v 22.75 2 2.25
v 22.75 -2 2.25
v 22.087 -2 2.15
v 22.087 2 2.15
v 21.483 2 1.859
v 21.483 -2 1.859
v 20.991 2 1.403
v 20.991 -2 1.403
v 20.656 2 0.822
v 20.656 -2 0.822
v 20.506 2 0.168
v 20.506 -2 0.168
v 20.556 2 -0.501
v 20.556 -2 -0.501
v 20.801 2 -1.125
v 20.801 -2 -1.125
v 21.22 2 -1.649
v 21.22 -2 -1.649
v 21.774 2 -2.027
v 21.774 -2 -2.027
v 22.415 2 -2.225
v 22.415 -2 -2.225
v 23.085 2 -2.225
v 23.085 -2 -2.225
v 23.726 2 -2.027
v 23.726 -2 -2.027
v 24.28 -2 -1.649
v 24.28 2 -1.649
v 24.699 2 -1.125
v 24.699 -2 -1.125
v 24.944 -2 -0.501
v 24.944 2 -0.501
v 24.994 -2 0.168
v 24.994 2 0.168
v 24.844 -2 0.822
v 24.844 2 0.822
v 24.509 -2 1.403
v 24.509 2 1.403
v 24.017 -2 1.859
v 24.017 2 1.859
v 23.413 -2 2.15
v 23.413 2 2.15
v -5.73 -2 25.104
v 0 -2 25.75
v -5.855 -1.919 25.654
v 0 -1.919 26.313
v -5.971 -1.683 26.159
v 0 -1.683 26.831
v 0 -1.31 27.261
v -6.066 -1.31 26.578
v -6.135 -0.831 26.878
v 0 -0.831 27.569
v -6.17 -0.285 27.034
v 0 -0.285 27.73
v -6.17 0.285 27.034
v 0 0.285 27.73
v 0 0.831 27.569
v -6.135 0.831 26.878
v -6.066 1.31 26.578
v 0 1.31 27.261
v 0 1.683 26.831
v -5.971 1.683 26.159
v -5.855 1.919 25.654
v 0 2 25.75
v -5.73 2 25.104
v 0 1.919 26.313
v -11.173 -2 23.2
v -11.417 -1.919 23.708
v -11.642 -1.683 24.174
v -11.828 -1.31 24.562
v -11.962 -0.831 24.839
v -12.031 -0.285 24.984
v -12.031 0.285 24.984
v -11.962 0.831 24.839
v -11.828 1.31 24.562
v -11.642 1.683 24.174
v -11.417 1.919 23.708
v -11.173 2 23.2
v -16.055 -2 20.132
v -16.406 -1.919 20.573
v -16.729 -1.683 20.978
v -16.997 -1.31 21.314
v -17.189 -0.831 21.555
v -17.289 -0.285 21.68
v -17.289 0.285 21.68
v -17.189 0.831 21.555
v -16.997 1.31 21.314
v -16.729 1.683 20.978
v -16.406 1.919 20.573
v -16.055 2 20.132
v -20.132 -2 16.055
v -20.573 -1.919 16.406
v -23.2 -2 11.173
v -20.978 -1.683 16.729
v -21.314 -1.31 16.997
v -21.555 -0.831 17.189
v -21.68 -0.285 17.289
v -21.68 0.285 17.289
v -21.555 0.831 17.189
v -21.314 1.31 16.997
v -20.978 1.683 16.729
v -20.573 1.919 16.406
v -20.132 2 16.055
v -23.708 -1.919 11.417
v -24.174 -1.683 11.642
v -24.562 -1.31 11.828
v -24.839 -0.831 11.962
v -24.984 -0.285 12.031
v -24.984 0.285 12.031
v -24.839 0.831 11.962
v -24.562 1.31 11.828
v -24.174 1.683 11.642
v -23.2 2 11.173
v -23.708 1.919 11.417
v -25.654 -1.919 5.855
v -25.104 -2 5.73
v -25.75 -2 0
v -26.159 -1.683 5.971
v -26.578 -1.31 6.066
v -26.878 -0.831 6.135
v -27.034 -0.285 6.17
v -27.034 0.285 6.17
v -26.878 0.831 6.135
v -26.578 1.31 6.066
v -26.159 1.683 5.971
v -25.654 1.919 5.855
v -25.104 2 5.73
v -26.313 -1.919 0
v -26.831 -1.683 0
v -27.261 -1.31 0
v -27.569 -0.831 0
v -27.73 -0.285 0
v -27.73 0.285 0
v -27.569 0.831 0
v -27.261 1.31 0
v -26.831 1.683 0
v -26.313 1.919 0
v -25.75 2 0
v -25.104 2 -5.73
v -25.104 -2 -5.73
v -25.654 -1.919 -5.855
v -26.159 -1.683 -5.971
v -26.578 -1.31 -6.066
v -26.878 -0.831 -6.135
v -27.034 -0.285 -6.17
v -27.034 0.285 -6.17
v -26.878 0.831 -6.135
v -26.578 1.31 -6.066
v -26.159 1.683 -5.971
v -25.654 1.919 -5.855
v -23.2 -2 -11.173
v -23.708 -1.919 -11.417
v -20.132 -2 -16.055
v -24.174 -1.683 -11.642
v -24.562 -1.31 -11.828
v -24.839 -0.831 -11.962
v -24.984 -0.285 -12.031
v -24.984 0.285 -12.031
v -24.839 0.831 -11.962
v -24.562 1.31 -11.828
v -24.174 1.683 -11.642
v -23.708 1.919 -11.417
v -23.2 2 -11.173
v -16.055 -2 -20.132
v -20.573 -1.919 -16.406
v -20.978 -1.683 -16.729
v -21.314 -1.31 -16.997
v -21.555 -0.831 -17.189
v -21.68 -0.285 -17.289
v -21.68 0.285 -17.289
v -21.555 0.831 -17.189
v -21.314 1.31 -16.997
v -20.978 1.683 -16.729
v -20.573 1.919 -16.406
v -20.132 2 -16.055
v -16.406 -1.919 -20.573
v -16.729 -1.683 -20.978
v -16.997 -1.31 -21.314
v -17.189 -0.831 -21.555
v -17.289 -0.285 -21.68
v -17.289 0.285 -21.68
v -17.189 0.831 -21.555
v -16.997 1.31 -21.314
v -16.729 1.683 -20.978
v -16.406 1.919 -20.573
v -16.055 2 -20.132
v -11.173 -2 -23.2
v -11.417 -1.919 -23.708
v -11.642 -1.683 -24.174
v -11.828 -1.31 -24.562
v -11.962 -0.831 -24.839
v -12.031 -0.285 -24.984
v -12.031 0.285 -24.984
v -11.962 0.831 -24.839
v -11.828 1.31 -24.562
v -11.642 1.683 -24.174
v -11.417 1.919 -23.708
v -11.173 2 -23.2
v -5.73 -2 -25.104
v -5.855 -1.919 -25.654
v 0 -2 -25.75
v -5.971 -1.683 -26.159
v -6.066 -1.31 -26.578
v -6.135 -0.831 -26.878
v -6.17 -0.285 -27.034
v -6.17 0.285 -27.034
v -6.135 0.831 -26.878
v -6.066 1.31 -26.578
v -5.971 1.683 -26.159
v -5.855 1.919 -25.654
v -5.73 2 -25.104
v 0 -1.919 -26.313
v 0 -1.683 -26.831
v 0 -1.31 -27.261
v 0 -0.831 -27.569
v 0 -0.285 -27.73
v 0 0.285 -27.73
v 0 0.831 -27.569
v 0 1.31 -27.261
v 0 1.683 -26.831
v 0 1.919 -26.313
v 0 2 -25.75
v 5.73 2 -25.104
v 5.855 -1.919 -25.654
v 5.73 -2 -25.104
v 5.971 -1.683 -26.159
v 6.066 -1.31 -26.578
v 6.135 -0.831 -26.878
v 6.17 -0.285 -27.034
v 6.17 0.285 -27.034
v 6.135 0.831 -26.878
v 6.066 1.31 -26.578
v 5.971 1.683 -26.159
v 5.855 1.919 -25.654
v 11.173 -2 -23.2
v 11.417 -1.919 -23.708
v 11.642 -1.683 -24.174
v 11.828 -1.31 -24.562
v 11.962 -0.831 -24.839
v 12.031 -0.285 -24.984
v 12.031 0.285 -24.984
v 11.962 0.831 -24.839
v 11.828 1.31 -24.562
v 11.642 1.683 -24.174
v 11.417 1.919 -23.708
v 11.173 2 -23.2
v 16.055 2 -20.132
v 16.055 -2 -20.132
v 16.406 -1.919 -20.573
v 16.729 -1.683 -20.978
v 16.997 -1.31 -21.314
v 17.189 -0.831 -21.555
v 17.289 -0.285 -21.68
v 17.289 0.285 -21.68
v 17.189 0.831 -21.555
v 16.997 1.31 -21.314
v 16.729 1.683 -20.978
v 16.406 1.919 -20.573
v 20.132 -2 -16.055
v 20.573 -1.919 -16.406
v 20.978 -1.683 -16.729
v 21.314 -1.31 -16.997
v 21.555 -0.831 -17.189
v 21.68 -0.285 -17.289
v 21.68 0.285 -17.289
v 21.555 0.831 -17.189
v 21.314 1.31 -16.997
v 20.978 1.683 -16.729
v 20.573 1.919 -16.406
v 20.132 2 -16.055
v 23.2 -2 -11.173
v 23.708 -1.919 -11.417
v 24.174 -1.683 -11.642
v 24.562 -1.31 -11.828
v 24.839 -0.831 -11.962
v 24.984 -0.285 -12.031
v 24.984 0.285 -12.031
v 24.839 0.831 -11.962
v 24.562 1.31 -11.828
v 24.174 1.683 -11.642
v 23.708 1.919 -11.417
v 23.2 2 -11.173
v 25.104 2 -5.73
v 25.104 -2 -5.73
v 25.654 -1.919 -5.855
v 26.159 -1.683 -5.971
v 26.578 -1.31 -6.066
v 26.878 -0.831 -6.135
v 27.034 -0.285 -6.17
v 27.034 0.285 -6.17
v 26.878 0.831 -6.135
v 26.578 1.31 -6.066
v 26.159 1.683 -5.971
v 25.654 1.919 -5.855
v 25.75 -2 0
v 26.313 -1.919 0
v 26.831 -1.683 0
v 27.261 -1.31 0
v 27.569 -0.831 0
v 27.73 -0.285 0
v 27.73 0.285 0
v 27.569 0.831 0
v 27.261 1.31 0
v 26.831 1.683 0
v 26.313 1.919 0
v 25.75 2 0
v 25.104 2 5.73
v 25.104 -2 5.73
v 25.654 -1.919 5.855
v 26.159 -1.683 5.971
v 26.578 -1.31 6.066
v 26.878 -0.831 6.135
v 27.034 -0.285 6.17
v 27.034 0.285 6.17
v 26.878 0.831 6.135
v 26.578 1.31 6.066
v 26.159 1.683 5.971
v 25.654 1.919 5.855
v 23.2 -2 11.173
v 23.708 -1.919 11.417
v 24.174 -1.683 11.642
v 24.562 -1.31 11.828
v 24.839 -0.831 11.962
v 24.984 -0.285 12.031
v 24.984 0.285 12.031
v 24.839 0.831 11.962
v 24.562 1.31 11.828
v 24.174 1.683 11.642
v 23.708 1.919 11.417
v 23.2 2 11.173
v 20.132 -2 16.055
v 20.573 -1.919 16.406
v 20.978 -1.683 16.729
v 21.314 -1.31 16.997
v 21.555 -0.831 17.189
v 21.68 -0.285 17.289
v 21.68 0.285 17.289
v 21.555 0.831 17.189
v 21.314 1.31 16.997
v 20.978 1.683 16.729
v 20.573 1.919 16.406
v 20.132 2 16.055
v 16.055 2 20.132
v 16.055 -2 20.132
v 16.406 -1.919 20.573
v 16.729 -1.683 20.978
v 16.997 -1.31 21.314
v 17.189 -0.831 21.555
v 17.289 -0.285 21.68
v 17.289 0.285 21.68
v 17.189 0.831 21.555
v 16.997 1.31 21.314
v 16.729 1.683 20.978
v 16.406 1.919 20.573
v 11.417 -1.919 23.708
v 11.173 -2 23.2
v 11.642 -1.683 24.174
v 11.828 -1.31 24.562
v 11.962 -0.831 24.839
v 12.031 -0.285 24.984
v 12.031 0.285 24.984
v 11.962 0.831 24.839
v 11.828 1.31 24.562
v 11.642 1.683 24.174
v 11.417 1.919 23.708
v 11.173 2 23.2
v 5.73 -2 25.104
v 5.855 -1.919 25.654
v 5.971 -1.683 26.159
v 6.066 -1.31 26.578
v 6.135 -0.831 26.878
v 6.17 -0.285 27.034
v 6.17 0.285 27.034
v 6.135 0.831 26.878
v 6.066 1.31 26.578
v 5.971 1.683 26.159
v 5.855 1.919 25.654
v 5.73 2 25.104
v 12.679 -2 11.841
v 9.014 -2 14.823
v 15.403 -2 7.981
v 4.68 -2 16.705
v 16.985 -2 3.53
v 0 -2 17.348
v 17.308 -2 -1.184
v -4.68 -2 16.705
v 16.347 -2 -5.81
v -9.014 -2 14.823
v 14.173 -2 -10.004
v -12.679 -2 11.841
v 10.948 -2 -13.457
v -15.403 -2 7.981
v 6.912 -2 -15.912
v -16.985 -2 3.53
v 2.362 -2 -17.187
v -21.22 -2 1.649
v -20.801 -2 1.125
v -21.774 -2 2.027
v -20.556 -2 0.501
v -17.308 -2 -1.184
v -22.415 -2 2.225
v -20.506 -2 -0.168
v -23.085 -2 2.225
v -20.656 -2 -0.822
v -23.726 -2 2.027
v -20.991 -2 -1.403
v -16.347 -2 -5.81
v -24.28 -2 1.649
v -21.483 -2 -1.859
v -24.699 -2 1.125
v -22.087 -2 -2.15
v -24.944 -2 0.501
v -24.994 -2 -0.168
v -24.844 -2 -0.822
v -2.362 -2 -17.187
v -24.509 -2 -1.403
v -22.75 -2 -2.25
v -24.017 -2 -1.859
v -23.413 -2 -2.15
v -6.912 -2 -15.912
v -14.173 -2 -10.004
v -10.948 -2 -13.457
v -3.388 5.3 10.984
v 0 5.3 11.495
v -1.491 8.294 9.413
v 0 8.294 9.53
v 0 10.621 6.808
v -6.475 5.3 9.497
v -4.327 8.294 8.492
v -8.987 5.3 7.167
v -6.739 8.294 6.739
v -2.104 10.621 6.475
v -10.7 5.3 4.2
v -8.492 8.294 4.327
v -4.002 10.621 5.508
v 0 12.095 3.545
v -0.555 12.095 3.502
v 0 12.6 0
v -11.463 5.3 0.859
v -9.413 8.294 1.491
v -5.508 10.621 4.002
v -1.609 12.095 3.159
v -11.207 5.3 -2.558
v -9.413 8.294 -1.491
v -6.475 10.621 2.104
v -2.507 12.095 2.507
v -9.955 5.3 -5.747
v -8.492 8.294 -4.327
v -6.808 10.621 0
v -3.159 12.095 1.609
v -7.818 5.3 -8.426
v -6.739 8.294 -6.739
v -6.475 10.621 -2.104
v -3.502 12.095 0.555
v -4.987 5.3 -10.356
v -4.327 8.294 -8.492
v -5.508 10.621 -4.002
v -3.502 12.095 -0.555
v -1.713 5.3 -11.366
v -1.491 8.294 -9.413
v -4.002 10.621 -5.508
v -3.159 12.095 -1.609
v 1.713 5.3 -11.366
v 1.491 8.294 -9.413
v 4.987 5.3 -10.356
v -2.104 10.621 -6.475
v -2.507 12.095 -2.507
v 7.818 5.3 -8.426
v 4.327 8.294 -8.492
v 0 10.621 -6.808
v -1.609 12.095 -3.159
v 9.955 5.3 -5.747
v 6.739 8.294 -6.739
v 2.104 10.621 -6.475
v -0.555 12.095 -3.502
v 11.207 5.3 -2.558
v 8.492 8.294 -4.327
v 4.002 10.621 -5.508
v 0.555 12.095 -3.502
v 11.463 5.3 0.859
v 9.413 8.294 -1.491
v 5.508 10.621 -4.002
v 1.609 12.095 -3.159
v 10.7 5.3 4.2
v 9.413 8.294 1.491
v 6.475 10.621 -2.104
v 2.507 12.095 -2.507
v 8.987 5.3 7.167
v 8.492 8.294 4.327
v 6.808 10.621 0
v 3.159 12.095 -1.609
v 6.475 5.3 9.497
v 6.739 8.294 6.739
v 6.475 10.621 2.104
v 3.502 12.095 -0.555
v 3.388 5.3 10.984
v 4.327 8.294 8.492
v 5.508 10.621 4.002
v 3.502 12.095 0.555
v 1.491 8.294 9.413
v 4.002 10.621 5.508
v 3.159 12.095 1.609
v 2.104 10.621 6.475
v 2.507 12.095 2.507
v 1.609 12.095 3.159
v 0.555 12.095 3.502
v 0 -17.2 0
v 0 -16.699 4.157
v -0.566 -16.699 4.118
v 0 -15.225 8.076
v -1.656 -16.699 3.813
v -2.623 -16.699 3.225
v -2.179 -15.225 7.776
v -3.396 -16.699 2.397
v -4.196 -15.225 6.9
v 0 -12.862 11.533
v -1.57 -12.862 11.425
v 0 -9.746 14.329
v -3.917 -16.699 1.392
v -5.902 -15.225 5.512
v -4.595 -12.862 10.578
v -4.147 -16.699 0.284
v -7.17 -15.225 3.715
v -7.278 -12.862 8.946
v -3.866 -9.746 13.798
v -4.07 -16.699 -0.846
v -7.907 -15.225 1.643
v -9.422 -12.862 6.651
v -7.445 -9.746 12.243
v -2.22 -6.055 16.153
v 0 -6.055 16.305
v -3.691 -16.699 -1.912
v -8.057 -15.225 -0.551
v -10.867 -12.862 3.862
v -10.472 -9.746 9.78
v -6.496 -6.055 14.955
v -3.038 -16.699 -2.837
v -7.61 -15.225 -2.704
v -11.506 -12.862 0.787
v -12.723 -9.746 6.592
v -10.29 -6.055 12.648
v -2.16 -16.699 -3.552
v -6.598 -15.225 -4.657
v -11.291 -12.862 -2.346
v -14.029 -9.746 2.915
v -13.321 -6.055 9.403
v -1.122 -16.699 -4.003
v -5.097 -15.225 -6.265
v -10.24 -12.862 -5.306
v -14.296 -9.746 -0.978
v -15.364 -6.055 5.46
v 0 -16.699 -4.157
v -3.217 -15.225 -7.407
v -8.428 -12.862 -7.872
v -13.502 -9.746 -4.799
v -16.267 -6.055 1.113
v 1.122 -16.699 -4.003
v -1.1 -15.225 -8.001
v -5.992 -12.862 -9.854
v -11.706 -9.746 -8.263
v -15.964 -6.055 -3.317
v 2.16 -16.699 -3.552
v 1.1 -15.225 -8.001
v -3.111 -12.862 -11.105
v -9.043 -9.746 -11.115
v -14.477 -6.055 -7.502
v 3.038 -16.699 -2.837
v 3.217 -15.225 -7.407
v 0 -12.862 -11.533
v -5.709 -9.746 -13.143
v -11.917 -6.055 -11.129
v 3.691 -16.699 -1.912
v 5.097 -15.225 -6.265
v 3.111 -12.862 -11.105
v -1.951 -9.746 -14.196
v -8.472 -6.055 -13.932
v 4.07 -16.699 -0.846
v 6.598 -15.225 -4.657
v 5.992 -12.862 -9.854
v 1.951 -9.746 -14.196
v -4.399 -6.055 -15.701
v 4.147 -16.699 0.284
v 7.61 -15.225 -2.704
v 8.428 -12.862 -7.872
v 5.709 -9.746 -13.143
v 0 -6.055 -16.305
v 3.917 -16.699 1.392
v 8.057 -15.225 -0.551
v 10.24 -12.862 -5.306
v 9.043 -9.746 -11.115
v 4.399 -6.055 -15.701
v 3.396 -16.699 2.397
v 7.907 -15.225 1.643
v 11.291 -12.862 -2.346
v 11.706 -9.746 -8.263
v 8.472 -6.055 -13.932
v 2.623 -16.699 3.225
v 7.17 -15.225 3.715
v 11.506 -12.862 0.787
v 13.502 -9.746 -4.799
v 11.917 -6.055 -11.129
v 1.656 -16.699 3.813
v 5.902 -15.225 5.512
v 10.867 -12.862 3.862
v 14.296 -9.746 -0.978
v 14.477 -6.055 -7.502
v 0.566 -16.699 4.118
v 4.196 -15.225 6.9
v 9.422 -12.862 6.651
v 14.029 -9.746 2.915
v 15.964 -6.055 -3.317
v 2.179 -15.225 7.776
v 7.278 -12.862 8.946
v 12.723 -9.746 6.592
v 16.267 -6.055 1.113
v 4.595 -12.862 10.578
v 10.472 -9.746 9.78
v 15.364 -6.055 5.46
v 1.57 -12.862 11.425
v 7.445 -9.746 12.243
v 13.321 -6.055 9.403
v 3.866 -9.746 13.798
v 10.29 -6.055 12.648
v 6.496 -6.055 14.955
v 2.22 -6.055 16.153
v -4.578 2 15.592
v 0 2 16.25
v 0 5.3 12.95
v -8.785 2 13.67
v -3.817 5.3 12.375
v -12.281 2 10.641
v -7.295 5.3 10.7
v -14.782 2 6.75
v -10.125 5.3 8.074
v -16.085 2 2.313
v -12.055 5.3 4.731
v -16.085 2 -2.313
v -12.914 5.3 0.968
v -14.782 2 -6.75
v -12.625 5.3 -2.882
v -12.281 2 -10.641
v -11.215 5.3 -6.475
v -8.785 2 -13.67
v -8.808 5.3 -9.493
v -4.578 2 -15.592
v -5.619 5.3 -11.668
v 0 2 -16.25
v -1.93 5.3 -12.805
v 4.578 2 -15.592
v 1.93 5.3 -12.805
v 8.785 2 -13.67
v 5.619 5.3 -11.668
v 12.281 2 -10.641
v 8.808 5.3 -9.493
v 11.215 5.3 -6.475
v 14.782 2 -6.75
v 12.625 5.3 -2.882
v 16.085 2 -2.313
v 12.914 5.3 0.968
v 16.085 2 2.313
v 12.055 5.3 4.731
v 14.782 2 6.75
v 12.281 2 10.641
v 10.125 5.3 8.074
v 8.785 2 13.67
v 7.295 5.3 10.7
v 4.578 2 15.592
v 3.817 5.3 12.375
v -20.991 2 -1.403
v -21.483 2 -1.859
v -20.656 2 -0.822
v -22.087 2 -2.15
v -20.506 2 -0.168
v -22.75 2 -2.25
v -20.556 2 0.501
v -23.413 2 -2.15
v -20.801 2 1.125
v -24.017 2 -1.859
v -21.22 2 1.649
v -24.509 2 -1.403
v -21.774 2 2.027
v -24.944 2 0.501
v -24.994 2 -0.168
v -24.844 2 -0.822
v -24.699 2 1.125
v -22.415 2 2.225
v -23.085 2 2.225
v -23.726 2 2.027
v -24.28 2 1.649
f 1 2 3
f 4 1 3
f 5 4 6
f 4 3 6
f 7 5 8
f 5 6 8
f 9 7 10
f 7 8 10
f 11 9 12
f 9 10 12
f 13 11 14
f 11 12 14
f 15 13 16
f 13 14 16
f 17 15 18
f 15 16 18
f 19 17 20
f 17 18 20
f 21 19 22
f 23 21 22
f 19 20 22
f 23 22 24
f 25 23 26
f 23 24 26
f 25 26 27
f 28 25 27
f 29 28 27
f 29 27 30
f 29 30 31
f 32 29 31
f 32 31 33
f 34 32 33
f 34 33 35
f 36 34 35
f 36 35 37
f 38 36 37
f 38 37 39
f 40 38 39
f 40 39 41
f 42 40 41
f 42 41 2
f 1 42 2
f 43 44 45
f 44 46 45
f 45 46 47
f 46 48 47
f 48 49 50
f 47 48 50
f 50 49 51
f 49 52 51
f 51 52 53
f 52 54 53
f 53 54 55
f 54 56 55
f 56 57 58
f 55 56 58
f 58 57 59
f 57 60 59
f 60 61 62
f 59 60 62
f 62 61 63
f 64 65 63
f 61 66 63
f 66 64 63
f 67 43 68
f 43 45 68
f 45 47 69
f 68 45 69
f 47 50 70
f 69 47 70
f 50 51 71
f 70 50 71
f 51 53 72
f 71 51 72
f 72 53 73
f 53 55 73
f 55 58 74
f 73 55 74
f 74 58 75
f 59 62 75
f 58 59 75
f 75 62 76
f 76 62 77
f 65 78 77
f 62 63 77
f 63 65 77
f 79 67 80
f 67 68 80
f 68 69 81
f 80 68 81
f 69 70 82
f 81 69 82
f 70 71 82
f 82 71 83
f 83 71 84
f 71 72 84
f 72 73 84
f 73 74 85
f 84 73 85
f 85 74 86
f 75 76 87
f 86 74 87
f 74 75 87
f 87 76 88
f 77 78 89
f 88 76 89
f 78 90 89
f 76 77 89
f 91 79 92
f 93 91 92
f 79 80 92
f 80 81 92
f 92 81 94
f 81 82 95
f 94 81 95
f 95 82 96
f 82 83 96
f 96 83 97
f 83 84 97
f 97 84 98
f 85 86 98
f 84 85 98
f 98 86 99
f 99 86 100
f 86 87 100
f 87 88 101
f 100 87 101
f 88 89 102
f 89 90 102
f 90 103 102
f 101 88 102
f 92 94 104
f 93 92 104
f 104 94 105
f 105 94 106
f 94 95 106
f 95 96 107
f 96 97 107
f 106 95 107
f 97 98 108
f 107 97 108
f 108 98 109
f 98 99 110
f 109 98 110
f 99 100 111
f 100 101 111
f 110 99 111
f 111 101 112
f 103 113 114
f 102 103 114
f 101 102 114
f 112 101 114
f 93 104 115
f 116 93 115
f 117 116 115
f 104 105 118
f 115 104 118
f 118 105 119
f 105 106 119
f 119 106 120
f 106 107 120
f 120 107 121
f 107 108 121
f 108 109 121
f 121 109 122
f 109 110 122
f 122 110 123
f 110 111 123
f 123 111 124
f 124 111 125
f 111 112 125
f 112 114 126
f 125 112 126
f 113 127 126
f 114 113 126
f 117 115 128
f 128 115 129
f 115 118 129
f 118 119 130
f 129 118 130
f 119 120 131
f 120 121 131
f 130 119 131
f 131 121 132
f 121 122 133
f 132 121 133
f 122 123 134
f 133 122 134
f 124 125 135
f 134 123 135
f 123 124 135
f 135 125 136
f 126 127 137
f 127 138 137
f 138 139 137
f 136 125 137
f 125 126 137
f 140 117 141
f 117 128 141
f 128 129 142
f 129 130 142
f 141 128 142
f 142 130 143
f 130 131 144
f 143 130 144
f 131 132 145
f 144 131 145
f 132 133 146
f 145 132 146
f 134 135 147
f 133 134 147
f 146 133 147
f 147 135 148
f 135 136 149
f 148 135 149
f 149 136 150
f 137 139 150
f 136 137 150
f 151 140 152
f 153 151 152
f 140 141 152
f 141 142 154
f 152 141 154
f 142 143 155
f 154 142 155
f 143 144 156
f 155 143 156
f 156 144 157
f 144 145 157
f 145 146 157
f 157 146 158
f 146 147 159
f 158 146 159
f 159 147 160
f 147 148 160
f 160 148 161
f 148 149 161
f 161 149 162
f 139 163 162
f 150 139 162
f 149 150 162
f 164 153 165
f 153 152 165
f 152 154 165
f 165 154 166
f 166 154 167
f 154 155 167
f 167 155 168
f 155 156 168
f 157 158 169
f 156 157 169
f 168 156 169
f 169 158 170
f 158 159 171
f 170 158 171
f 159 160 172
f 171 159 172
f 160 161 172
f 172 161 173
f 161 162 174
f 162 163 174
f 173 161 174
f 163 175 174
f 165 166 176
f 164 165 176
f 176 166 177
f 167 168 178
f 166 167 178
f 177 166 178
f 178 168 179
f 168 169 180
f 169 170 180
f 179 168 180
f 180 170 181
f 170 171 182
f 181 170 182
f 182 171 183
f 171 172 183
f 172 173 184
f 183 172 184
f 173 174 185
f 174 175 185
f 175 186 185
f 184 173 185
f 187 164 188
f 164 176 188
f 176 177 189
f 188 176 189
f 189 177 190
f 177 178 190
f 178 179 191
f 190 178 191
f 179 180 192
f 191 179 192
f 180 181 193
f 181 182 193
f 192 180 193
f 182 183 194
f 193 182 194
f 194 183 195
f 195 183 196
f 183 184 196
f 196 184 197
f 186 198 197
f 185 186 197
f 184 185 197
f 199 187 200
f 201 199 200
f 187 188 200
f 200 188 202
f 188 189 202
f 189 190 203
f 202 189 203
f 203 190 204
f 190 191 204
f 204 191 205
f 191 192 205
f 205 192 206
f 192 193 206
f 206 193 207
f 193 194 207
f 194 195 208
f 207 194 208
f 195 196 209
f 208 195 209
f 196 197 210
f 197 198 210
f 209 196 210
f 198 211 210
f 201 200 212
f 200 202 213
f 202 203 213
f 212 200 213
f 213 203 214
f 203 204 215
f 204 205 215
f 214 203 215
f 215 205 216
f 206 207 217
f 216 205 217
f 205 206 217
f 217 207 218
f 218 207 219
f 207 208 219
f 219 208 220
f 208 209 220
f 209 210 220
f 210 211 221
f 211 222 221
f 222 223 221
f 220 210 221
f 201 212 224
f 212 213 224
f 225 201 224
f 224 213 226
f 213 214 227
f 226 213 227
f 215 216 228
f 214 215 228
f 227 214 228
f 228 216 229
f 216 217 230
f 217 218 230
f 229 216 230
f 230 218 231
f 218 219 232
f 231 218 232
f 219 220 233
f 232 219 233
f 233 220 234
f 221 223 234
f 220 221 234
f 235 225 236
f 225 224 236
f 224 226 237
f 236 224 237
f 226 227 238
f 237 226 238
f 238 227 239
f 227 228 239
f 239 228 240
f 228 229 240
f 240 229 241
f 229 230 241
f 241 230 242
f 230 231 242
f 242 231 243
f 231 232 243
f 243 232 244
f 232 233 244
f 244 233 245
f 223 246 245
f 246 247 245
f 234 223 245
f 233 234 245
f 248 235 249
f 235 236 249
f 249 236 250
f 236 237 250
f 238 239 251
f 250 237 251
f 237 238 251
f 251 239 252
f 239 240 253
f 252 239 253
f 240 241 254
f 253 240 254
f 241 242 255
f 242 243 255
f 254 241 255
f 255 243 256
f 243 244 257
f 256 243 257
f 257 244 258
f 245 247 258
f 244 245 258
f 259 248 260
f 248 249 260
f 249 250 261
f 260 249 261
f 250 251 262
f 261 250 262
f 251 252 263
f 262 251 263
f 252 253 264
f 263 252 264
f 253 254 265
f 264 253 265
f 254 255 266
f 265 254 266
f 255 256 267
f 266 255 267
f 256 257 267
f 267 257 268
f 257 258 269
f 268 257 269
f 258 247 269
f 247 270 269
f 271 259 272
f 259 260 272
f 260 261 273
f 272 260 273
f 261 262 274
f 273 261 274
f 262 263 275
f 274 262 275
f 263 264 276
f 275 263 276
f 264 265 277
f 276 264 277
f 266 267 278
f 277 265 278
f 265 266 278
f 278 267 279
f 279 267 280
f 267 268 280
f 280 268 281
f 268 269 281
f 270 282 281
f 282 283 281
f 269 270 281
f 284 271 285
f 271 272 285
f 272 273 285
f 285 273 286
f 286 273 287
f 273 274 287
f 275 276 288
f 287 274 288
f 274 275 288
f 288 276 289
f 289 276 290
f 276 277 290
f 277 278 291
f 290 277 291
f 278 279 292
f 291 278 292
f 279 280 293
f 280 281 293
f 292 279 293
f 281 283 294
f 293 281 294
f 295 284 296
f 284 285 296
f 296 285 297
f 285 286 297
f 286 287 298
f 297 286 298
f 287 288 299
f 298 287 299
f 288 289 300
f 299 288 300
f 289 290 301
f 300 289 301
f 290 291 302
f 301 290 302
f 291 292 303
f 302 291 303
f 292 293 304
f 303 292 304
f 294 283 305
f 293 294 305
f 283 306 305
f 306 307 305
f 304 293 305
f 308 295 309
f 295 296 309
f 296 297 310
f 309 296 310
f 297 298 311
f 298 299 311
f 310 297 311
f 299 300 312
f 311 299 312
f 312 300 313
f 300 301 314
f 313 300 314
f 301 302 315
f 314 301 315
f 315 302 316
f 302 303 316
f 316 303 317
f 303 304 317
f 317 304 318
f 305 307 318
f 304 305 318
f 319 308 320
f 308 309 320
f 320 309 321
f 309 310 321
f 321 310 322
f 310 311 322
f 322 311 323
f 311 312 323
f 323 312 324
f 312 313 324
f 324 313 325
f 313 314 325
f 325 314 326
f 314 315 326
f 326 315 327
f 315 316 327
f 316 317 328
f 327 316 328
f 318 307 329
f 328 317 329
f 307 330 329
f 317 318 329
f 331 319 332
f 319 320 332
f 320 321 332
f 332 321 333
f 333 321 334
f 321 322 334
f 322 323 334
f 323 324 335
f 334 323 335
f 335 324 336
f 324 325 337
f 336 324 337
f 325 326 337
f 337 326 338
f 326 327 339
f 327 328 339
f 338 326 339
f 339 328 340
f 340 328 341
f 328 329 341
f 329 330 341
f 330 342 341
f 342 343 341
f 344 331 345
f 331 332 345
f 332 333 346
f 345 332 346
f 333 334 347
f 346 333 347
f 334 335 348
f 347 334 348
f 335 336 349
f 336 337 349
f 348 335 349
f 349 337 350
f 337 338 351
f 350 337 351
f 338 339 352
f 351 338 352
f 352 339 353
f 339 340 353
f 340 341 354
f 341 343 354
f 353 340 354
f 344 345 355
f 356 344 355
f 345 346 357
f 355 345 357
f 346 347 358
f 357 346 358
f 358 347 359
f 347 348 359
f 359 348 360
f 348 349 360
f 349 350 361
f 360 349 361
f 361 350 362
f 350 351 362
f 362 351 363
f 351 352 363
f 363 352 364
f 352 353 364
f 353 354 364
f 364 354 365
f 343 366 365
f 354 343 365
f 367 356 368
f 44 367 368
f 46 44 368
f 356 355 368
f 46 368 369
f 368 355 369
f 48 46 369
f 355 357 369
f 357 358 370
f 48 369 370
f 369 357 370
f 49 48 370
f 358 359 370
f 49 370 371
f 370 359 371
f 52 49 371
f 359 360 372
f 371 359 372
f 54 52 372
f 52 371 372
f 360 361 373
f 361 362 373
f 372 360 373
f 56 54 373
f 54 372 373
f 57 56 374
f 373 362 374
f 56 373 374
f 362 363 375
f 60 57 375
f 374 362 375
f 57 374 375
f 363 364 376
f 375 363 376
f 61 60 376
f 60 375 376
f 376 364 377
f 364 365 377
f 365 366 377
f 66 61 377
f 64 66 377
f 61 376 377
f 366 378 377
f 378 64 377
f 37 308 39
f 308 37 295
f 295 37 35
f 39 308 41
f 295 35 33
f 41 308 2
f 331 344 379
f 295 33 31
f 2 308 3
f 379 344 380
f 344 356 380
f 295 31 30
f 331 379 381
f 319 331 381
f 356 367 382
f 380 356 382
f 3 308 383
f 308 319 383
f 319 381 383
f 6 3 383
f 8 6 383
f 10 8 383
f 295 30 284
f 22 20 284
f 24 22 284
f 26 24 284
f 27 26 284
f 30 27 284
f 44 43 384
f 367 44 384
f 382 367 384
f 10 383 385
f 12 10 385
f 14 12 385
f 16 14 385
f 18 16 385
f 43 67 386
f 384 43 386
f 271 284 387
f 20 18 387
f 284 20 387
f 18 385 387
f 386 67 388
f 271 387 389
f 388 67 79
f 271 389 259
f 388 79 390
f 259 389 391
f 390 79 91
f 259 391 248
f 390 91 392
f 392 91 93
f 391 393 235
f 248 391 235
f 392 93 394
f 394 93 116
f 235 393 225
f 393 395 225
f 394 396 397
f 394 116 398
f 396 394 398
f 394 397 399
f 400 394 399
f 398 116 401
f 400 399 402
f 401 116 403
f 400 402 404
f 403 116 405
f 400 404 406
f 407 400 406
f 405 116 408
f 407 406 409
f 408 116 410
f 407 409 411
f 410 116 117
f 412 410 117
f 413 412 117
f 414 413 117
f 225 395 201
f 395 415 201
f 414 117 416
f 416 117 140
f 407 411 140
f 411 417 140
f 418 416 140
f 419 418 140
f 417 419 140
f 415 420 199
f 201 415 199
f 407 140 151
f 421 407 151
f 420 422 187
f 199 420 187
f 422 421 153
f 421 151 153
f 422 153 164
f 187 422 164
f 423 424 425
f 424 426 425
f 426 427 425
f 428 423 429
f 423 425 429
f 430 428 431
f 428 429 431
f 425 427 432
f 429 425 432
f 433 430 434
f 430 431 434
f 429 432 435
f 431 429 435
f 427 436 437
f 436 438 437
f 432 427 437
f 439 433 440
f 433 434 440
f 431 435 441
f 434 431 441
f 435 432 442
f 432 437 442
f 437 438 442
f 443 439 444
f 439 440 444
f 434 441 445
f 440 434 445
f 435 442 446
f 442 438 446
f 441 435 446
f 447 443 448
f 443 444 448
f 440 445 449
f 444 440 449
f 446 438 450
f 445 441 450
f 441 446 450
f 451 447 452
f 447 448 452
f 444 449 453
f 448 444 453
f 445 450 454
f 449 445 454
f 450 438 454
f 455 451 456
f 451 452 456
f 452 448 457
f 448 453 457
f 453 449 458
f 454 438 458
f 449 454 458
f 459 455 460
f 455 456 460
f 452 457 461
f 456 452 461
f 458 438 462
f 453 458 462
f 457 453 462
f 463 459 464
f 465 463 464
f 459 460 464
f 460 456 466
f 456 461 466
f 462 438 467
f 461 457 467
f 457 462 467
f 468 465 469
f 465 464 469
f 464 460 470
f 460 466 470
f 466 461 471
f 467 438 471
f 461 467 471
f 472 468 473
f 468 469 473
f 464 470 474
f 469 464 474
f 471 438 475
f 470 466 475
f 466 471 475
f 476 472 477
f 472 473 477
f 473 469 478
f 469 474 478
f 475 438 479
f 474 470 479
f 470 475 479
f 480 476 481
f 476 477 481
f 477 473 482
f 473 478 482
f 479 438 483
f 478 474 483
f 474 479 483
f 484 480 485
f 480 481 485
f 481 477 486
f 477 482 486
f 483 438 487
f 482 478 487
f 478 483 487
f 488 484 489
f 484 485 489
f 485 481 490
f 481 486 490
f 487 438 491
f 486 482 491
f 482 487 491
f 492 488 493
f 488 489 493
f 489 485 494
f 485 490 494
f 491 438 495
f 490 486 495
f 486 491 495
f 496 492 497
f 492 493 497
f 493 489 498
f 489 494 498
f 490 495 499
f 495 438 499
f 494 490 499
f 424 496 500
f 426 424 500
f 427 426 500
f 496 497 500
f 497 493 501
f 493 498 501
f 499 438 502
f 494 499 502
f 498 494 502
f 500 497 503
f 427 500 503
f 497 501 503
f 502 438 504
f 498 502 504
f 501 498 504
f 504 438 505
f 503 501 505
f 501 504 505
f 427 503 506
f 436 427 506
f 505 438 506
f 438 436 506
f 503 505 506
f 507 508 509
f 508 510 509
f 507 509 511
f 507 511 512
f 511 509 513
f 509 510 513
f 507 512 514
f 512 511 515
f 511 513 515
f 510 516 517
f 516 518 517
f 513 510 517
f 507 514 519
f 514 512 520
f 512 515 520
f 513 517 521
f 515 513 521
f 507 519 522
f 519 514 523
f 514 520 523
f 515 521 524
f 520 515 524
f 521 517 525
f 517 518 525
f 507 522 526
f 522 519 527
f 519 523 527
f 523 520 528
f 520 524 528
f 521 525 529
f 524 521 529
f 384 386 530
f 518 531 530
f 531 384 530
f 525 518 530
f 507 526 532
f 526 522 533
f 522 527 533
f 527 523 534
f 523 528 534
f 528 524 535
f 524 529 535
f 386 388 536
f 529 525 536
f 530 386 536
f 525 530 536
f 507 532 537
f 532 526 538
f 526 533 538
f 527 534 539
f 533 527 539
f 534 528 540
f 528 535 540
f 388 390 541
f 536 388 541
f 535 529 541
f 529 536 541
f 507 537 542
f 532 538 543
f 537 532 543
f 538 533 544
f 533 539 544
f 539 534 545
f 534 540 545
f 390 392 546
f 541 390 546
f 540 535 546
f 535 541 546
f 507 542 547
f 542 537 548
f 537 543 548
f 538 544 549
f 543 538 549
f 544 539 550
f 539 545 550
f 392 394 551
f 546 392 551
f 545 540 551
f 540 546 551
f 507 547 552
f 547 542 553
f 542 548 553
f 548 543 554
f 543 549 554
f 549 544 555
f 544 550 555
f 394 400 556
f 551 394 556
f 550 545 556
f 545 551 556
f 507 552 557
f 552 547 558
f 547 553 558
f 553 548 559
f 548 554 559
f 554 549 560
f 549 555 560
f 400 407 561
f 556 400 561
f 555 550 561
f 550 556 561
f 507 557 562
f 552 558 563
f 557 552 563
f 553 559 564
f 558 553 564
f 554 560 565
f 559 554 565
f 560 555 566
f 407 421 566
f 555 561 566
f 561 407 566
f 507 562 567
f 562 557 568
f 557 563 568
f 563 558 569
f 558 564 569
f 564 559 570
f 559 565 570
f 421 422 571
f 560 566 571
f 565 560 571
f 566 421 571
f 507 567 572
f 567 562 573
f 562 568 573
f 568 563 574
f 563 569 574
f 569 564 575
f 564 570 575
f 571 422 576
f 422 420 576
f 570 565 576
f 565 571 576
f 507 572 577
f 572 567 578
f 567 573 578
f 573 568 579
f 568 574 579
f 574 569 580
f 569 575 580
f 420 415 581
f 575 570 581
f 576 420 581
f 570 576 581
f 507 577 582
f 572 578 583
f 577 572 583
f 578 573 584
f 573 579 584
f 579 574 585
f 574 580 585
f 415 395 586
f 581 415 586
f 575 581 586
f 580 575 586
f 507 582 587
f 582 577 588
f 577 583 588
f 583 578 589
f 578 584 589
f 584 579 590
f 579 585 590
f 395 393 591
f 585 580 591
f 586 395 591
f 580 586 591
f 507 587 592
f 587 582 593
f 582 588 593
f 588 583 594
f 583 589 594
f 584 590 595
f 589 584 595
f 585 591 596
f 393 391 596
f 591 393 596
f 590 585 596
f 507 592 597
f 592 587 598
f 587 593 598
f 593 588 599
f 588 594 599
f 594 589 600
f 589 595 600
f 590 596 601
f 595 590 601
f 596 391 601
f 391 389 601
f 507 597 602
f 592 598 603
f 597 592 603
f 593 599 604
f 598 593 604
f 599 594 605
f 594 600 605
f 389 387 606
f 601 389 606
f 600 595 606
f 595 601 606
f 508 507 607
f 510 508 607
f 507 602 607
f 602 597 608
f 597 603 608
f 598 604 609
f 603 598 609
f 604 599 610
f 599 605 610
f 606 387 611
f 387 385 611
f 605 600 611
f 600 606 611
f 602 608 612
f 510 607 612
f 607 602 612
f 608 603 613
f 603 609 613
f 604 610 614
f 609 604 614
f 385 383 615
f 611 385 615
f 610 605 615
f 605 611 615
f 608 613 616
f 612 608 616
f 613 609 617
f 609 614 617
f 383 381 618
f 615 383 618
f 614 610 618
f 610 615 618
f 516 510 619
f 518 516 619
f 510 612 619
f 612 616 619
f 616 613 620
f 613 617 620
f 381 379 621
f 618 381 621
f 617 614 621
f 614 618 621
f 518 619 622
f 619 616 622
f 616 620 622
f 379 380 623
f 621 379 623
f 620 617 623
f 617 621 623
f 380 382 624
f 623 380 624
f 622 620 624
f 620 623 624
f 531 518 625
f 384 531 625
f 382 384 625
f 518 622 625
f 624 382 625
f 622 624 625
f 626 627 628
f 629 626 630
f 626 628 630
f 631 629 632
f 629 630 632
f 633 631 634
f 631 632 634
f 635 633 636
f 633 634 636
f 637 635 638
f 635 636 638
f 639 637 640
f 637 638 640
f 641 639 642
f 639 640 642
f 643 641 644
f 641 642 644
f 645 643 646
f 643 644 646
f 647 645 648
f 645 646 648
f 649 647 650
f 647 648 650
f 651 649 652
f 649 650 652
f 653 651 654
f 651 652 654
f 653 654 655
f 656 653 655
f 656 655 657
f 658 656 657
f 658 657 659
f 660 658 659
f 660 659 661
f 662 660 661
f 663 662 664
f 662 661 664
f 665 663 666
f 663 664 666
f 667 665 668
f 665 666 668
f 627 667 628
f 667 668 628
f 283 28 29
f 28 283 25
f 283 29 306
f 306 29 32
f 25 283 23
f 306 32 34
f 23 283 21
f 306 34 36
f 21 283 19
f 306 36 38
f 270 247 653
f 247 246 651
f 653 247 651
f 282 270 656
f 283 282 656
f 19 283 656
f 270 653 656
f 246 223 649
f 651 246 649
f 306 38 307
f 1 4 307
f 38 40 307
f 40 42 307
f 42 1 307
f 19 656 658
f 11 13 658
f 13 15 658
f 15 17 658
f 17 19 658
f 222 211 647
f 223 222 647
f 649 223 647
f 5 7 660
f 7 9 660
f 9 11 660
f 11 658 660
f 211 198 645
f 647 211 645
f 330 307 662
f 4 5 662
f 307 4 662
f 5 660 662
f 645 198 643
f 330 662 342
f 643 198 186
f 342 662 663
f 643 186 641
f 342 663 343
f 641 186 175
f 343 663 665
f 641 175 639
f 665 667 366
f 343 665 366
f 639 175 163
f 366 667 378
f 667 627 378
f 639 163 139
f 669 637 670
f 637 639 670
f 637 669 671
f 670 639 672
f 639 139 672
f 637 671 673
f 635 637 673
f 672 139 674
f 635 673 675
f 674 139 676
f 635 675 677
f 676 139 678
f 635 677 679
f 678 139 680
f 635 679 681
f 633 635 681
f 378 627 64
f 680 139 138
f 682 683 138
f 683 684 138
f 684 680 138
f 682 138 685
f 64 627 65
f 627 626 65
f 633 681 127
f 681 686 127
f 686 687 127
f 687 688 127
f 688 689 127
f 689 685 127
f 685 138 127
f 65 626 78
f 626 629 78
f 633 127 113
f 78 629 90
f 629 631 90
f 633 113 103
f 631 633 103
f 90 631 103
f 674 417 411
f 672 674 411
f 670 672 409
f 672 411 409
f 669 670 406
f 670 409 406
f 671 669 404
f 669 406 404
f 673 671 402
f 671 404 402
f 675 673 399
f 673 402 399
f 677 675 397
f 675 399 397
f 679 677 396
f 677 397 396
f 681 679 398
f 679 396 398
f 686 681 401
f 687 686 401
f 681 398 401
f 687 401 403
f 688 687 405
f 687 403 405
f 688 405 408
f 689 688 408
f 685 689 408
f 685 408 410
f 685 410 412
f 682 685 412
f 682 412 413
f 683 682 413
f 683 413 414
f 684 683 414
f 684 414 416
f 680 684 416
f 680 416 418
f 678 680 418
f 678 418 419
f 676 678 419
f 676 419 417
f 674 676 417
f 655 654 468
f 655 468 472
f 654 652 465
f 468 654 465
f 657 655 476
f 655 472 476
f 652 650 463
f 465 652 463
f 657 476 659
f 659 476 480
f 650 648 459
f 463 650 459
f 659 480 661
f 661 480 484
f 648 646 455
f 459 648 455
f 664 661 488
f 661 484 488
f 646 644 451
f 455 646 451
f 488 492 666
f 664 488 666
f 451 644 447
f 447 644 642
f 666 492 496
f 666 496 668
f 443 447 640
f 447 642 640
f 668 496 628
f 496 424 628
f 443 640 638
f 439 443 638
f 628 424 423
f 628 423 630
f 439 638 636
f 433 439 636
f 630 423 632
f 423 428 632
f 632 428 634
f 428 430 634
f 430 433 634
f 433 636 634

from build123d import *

# Parameters (mm, degrees)
SKETCH_2_R          = 2.25
CUT_EXTRUDE_1_DEPTH = 43.085211311


with BuildPart() as part:
    # ｽｹｯﾁ1 → 回転1 (revolve)
    with BuildSketch(Plane.XY, mode=Mode.PRIVATE) as revolve_1_sk:
        with BuildLine():
            Line((-25.75, 2), (-16.25, 2))
            Line((-16.25, 2), (-12.95, 5.3))
            Line((-12.95, 5.3), (-11.494781425, 5.3))
            ThreePointArc((-11.494781425, 5.3), (-6.808450631, 10.620774226), (0, 12.6))
            Line((0, 12.6), (0, -17.2))
            ThreePointArc((0, -17.2), (-11.532562595, -12.862446581), (-17.348198754, -2))
            Line((-17.348198754, -2), (-25.75, -2))
            ThreePointArc((-25.75, -2), (-27.75, 0), (-25.75, 2))
        make_face()
    revolve(revolve_1_sk.sketch.rotate(Axis((0, 0, 0), (0, -1, 0)), 270), axis=Axis((0, 0, 0), (0, -1, 0)))

    # ｽｹｯﾁ2 → ｶｯﾄ - 押し出し1 (cut, through all)
    with BuildSketch(Plane.XZ.offset(2)):
        with Locations(Location((-22.75, 0, 0), (0, 0, 270))):
            Circle(SKETCH_2_R)
        with Locations(Location((22.75, 0, 0), (0, 0, 90))):
            Circle(SKETCH_2_R)
    extrude(amount=-CUT_EXTRUDE_1_DEPTH, mode=Mode.SUBTRACT)


solid = part.part
